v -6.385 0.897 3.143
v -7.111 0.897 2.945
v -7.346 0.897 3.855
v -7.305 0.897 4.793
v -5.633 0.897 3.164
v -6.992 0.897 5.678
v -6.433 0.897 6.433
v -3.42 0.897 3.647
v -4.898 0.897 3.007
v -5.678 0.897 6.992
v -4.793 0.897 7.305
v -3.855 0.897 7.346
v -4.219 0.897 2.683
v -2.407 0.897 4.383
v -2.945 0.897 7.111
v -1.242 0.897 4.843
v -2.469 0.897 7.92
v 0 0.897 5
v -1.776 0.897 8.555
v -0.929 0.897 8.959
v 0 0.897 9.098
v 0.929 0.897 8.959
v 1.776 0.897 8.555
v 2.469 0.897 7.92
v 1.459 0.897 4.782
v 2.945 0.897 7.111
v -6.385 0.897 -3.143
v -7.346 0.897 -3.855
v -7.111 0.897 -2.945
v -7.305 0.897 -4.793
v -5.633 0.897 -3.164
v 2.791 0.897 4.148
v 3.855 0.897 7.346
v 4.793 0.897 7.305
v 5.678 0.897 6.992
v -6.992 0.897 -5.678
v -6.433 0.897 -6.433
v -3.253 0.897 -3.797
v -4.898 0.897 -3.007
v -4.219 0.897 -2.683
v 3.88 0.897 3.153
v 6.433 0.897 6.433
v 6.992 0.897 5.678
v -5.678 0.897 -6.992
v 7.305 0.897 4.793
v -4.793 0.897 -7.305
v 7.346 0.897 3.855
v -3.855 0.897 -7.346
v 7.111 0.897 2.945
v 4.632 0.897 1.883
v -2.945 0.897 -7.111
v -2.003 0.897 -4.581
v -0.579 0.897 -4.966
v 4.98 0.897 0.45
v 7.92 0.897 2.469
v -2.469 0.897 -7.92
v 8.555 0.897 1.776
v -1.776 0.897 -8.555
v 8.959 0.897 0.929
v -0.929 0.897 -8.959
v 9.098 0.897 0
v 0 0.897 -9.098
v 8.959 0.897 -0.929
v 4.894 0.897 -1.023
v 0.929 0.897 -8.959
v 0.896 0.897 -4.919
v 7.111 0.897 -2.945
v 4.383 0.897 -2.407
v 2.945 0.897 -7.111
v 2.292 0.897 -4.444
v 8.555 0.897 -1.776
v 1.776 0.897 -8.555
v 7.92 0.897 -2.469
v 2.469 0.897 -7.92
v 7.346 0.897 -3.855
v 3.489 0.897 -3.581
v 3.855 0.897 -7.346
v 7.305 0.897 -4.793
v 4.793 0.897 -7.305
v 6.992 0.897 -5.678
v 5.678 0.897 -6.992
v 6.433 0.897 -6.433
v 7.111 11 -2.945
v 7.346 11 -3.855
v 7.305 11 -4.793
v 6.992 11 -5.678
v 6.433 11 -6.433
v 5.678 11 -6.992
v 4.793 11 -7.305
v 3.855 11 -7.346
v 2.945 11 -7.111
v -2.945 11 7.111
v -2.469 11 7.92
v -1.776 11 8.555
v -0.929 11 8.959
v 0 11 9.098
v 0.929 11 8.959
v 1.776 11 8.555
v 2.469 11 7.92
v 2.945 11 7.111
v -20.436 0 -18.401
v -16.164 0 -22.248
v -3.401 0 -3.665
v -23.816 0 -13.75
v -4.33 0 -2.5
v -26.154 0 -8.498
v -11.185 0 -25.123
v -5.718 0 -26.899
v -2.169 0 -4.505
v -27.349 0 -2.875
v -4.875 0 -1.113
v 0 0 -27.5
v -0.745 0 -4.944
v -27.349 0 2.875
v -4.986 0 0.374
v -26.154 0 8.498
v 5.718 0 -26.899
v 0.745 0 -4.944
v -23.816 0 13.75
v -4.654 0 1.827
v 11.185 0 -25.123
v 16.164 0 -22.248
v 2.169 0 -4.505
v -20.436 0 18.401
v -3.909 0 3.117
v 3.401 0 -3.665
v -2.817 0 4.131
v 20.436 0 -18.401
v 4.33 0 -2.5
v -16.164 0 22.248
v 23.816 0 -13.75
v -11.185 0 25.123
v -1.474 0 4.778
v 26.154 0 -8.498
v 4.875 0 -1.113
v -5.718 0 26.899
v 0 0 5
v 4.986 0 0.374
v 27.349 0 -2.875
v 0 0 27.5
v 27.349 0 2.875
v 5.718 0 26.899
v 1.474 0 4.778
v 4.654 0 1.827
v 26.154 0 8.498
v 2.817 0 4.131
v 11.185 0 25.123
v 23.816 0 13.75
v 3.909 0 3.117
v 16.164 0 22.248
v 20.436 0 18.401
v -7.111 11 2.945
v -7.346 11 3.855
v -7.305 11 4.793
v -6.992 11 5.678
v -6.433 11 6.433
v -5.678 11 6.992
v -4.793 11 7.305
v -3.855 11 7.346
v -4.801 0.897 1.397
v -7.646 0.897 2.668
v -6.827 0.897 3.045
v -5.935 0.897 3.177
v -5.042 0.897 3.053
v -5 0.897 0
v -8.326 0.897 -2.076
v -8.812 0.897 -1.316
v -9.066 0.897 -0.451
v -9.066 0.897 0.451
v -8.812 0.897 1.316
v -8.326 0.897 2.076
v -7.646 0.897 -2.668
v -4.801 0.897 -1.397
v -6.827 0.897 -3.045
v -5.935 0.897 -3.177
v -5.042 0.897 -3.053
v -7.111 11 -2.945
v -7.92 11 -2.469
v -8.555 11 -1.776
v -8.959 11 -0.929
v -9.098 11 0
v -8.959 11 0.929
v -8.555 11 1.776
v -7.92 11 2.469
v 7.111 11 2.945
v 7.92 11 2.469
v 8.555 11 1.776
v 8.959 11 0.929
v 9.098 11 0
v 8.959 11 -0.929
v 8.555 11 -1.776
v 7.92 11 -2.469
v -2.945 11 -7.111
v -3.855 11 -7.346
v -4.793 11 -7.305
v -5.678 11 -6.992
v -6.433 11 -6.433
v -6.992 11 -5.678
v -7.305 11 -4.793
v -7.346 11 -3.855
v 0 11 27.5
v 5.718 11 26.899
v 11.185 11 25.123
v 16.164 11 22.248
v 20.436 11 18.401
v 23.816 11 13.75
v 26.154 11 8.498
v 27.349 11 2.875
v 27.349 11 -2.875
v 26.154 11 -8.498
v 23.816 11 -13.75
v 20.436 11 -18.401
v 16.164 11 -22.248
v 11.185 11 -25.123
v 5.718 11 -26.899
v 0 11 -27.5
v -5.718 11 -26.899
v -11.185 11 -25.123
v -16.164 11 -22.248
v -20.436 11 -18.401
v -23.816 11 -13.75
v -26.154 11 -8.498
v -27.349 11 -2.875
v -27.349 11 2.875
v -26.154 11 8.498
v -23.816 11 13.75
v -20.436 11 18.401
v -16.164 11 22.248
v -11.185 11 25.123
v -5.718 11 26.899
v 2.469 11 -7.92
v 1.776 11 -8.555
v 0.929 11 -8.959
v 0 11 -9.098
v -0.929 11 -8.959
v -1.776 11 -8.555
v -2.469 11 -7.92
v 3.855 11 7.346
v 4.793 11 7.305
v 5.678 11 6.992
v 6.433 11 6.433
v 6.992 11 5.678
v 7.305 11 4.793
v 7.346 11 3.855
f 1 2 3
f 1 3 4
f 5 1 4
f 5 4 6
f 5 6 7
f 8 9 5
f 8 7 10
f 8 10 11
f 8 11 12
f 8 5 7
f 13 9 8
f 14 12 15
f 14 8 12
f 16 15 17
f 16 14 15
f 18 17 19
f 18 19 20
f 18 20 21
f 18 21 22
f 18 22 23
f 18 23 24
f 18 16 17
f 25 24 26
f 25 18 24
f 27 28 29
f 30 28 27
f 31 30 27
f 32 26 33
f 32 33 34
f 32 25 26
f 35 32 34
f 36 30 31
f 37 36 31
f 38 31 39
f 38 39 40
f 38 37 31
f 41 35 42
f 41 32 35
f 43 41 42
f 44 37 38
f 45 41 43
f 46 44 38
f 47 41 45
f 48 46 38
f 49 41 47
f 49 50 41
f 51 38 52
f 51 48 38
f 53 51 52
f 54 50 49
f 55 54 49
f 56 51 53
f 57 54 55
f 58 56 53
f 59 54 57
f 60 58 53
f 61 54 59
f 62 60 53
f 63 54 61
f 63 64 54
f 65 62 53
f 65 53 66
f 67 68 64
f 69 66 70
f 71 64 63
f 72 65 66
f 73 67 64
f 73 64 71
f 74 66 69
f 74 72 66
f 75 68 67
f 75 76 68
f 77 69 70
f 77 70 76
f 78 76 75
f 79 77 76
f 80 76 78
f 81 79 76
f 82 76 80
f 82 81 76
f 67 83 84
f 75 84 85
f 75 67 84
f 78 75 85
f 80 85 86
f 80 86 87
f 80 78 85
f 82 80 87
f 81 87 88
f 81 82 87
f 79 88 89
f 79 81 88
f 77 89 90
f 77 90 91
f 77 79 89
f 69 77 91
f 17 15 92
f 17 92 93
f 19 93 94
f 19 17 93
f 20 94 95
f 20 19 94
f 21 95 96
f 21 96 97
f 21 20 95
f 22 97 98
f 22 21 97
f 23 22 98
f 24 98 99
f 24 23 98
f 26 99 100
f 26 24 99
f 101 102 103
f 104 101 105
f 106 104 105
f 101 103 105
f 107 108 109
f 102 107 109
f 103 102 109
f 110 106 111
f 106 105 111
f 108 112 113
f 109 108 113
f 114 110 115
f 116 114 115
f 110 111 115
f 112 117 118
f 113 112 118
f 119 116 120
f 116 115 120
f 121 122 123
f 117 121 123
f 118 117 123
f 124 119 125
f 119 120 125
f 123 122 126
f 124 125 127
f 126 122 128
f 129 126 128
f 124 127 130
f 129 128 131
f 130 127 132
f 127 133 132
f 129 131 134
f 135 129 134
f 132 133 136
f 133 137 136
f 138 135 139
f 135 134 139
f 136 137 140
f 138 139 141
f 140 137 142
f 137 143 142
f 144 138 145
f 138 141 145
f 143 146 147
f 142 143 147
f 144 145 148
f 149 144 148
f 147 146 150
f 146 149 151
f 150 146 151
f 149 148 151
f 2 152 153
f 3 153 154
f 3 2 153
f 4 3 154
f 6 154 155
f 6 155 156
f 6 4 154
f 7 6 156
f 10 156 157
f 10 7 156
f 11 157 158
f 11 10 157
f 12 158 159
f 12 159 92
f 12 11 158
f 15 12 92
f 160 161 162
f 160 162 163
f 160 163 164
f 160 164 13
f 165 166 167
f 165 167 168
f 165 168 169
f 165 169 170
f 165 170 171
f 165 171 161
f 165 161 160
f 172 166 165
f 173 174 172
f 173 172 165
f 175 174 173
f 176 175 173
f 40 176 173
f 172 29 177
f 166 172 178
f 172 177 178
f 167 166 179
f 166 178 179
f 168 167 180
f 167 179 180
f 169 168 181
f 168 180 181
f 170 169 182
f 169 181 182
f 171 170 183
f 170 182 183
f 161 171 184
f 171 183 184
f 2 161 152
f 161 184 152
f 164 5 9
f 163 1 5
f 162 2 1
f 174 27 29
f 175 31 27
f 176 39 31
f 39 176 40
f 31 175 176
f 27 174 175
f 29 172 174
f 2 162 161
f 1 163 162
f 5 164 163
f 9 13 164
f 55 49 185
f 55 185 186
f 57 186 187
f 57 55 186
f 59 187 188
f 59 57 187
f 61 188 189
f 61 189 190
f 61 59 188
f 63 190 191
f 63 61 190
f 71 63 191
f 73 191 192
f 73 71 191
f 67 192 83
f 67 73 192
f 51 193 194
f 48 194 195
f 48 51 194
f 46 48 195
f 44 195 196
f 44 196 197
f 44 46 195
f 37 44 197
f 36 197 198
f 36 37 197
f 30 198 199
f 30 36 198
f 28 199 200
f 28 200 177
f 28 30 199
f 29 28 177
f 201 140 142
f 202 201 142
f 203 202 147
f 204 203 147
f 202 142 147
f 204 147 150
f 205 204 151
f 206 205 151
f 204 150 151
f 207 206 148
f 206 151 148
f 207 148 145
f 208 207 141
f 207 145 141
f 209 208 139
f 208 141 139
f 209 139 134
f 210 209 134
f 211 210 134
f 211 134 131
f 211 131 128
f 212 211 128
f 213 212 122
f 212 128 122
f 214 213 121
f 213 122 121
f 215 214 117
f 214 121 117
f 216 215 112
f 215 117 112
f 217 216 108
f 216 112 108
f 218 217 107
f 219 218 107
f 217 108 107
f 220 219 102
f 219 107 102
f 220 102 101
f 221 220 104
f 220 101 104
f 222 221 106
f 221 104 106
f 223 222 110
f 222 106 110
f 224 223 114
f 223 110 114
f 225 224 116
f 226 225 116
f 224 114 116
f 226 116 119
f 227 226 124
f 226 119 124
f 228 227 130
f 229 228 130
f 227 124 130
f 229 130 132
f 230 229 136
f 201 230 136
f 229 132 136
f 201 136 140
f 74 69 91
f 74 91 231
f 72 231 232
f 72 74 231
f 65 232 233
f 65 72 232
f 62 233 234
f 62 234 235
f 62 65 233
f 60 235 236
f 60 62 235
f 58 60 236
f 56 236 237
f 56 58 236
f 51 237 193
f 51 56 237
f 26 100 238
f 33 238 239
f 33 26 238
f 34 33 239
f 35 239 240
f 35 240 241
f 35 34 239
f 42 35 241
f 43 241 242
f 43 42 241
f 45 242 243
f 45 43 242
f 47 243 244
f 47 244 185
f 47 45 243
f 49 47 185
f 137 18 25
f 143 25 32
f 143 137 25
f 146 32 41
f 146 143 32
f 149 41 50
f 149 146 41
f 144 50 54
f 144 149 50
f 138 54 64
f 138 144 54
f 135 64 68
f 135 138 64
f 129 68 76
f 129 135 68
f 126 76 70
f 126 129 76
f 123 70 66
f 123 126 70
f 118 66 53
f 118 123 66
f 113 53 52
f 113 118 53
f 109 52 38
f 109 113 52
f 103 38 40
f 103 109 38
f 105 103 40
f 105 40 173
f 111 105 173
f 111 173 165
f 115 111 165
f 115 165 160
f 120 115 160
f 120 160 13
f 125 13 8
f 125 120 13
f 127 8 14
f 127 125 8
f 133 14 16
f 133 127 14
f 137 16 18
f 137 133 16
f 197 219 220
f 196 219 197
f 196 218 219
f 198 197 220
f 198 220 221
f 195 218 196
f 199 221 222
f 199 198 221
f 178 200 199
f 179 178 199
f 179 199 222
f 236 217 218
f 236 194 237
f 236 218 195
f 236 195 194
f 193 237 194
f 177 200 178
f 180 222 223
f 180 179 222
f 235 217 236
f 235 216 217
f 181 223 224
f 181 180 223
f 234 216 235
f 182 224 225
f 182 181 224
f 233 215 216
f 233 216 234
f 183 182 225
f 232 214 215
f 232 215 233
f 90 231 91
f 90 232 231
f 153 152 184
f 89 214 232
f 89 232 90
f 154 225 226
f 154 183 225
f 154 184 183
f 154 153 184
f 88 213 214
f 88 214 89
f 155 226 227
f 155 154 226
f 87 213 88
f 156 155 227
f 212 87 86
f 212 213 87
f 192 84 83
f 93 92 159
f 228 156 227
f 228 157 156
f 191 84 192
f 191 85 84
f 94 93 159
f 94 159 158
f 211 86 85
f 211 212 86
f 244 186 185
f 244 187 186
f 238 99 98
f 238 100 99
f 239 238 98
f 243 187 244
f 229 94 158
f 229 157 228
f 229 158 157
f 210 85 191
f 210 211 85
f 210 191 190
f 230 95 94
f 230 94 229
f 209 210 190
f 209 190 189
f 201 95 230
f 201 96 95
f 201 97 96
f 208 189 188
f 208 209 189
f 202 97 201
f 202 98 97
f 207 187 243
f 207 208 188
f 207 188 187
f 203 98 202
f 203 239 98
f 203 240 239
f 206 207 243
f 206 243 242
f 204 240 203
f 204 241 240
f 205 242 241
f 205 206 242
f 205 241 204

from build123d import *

# Parameters (mm, degrees)
SKETCH1_R           = 27.5
BOSS_EXTRUDE1_DEPTH = 11
SKETCH2_R           = 5
CUT_EXTRUDE1_DEPTH  = 41.416580756
SKETCH3_R           = 3.176711529
CUT_EXTRUDE2_DEPTH  = 10.102814625
CIRPATTERN1_COUNT   = 8


with BuildPart() as part:
    # Sketch1 → Boss-Extrude1 (new body)
    with BuildSketch(Plane(origin=(0, 0, 0), x_dir=(1, 0, 0), z_dir=(0, 1, 0))):
        Circle(SKETCH1_R)
    extrude(amount=BOSS_EXTRUDE1_DEPTH)

    # Sketch2 → Cut-Extrude1 (cut, through all)
    with BuildSketch(Plane(origin=(0, 0, 0), x_dir=(1, 0, 0), z_dir=(0, 1, 0))):
        Circle(SKETCH2_R)
    extrude(amount=CUT_EXTRUDE1_DEPTH, mode=Mode.SUBTRACT)

    # Sketch3 → Cut-Extrude2 (cut)
    with BuildSketch(Plane(origin=(0, 11, 0), x_dir=(1, 0, 0), z_dir=(0, 1, 0))):
        with Locations((-5.920961164, 0)):
            Circle(SKETCH3_R)
    cut_extrude2 = extrude(amount=-CUT_EXTRUDE2_DEPTH, mode=Mode.SUBTRACT)

    # CirPattern1: Cut-Extrude2 ×8 about axis
    cirpattern1_axis = Axis((0, 0, 0), (0, 1, 0))
    for i in range(1, CIRPATTERN1_COUNT):
        add(cut_extrude2.rotate(cirpattern1_axis, i * 360 / CIRPATTERN1_COUNT), mode=Mode.SUBTRACT)


solid = part.part
